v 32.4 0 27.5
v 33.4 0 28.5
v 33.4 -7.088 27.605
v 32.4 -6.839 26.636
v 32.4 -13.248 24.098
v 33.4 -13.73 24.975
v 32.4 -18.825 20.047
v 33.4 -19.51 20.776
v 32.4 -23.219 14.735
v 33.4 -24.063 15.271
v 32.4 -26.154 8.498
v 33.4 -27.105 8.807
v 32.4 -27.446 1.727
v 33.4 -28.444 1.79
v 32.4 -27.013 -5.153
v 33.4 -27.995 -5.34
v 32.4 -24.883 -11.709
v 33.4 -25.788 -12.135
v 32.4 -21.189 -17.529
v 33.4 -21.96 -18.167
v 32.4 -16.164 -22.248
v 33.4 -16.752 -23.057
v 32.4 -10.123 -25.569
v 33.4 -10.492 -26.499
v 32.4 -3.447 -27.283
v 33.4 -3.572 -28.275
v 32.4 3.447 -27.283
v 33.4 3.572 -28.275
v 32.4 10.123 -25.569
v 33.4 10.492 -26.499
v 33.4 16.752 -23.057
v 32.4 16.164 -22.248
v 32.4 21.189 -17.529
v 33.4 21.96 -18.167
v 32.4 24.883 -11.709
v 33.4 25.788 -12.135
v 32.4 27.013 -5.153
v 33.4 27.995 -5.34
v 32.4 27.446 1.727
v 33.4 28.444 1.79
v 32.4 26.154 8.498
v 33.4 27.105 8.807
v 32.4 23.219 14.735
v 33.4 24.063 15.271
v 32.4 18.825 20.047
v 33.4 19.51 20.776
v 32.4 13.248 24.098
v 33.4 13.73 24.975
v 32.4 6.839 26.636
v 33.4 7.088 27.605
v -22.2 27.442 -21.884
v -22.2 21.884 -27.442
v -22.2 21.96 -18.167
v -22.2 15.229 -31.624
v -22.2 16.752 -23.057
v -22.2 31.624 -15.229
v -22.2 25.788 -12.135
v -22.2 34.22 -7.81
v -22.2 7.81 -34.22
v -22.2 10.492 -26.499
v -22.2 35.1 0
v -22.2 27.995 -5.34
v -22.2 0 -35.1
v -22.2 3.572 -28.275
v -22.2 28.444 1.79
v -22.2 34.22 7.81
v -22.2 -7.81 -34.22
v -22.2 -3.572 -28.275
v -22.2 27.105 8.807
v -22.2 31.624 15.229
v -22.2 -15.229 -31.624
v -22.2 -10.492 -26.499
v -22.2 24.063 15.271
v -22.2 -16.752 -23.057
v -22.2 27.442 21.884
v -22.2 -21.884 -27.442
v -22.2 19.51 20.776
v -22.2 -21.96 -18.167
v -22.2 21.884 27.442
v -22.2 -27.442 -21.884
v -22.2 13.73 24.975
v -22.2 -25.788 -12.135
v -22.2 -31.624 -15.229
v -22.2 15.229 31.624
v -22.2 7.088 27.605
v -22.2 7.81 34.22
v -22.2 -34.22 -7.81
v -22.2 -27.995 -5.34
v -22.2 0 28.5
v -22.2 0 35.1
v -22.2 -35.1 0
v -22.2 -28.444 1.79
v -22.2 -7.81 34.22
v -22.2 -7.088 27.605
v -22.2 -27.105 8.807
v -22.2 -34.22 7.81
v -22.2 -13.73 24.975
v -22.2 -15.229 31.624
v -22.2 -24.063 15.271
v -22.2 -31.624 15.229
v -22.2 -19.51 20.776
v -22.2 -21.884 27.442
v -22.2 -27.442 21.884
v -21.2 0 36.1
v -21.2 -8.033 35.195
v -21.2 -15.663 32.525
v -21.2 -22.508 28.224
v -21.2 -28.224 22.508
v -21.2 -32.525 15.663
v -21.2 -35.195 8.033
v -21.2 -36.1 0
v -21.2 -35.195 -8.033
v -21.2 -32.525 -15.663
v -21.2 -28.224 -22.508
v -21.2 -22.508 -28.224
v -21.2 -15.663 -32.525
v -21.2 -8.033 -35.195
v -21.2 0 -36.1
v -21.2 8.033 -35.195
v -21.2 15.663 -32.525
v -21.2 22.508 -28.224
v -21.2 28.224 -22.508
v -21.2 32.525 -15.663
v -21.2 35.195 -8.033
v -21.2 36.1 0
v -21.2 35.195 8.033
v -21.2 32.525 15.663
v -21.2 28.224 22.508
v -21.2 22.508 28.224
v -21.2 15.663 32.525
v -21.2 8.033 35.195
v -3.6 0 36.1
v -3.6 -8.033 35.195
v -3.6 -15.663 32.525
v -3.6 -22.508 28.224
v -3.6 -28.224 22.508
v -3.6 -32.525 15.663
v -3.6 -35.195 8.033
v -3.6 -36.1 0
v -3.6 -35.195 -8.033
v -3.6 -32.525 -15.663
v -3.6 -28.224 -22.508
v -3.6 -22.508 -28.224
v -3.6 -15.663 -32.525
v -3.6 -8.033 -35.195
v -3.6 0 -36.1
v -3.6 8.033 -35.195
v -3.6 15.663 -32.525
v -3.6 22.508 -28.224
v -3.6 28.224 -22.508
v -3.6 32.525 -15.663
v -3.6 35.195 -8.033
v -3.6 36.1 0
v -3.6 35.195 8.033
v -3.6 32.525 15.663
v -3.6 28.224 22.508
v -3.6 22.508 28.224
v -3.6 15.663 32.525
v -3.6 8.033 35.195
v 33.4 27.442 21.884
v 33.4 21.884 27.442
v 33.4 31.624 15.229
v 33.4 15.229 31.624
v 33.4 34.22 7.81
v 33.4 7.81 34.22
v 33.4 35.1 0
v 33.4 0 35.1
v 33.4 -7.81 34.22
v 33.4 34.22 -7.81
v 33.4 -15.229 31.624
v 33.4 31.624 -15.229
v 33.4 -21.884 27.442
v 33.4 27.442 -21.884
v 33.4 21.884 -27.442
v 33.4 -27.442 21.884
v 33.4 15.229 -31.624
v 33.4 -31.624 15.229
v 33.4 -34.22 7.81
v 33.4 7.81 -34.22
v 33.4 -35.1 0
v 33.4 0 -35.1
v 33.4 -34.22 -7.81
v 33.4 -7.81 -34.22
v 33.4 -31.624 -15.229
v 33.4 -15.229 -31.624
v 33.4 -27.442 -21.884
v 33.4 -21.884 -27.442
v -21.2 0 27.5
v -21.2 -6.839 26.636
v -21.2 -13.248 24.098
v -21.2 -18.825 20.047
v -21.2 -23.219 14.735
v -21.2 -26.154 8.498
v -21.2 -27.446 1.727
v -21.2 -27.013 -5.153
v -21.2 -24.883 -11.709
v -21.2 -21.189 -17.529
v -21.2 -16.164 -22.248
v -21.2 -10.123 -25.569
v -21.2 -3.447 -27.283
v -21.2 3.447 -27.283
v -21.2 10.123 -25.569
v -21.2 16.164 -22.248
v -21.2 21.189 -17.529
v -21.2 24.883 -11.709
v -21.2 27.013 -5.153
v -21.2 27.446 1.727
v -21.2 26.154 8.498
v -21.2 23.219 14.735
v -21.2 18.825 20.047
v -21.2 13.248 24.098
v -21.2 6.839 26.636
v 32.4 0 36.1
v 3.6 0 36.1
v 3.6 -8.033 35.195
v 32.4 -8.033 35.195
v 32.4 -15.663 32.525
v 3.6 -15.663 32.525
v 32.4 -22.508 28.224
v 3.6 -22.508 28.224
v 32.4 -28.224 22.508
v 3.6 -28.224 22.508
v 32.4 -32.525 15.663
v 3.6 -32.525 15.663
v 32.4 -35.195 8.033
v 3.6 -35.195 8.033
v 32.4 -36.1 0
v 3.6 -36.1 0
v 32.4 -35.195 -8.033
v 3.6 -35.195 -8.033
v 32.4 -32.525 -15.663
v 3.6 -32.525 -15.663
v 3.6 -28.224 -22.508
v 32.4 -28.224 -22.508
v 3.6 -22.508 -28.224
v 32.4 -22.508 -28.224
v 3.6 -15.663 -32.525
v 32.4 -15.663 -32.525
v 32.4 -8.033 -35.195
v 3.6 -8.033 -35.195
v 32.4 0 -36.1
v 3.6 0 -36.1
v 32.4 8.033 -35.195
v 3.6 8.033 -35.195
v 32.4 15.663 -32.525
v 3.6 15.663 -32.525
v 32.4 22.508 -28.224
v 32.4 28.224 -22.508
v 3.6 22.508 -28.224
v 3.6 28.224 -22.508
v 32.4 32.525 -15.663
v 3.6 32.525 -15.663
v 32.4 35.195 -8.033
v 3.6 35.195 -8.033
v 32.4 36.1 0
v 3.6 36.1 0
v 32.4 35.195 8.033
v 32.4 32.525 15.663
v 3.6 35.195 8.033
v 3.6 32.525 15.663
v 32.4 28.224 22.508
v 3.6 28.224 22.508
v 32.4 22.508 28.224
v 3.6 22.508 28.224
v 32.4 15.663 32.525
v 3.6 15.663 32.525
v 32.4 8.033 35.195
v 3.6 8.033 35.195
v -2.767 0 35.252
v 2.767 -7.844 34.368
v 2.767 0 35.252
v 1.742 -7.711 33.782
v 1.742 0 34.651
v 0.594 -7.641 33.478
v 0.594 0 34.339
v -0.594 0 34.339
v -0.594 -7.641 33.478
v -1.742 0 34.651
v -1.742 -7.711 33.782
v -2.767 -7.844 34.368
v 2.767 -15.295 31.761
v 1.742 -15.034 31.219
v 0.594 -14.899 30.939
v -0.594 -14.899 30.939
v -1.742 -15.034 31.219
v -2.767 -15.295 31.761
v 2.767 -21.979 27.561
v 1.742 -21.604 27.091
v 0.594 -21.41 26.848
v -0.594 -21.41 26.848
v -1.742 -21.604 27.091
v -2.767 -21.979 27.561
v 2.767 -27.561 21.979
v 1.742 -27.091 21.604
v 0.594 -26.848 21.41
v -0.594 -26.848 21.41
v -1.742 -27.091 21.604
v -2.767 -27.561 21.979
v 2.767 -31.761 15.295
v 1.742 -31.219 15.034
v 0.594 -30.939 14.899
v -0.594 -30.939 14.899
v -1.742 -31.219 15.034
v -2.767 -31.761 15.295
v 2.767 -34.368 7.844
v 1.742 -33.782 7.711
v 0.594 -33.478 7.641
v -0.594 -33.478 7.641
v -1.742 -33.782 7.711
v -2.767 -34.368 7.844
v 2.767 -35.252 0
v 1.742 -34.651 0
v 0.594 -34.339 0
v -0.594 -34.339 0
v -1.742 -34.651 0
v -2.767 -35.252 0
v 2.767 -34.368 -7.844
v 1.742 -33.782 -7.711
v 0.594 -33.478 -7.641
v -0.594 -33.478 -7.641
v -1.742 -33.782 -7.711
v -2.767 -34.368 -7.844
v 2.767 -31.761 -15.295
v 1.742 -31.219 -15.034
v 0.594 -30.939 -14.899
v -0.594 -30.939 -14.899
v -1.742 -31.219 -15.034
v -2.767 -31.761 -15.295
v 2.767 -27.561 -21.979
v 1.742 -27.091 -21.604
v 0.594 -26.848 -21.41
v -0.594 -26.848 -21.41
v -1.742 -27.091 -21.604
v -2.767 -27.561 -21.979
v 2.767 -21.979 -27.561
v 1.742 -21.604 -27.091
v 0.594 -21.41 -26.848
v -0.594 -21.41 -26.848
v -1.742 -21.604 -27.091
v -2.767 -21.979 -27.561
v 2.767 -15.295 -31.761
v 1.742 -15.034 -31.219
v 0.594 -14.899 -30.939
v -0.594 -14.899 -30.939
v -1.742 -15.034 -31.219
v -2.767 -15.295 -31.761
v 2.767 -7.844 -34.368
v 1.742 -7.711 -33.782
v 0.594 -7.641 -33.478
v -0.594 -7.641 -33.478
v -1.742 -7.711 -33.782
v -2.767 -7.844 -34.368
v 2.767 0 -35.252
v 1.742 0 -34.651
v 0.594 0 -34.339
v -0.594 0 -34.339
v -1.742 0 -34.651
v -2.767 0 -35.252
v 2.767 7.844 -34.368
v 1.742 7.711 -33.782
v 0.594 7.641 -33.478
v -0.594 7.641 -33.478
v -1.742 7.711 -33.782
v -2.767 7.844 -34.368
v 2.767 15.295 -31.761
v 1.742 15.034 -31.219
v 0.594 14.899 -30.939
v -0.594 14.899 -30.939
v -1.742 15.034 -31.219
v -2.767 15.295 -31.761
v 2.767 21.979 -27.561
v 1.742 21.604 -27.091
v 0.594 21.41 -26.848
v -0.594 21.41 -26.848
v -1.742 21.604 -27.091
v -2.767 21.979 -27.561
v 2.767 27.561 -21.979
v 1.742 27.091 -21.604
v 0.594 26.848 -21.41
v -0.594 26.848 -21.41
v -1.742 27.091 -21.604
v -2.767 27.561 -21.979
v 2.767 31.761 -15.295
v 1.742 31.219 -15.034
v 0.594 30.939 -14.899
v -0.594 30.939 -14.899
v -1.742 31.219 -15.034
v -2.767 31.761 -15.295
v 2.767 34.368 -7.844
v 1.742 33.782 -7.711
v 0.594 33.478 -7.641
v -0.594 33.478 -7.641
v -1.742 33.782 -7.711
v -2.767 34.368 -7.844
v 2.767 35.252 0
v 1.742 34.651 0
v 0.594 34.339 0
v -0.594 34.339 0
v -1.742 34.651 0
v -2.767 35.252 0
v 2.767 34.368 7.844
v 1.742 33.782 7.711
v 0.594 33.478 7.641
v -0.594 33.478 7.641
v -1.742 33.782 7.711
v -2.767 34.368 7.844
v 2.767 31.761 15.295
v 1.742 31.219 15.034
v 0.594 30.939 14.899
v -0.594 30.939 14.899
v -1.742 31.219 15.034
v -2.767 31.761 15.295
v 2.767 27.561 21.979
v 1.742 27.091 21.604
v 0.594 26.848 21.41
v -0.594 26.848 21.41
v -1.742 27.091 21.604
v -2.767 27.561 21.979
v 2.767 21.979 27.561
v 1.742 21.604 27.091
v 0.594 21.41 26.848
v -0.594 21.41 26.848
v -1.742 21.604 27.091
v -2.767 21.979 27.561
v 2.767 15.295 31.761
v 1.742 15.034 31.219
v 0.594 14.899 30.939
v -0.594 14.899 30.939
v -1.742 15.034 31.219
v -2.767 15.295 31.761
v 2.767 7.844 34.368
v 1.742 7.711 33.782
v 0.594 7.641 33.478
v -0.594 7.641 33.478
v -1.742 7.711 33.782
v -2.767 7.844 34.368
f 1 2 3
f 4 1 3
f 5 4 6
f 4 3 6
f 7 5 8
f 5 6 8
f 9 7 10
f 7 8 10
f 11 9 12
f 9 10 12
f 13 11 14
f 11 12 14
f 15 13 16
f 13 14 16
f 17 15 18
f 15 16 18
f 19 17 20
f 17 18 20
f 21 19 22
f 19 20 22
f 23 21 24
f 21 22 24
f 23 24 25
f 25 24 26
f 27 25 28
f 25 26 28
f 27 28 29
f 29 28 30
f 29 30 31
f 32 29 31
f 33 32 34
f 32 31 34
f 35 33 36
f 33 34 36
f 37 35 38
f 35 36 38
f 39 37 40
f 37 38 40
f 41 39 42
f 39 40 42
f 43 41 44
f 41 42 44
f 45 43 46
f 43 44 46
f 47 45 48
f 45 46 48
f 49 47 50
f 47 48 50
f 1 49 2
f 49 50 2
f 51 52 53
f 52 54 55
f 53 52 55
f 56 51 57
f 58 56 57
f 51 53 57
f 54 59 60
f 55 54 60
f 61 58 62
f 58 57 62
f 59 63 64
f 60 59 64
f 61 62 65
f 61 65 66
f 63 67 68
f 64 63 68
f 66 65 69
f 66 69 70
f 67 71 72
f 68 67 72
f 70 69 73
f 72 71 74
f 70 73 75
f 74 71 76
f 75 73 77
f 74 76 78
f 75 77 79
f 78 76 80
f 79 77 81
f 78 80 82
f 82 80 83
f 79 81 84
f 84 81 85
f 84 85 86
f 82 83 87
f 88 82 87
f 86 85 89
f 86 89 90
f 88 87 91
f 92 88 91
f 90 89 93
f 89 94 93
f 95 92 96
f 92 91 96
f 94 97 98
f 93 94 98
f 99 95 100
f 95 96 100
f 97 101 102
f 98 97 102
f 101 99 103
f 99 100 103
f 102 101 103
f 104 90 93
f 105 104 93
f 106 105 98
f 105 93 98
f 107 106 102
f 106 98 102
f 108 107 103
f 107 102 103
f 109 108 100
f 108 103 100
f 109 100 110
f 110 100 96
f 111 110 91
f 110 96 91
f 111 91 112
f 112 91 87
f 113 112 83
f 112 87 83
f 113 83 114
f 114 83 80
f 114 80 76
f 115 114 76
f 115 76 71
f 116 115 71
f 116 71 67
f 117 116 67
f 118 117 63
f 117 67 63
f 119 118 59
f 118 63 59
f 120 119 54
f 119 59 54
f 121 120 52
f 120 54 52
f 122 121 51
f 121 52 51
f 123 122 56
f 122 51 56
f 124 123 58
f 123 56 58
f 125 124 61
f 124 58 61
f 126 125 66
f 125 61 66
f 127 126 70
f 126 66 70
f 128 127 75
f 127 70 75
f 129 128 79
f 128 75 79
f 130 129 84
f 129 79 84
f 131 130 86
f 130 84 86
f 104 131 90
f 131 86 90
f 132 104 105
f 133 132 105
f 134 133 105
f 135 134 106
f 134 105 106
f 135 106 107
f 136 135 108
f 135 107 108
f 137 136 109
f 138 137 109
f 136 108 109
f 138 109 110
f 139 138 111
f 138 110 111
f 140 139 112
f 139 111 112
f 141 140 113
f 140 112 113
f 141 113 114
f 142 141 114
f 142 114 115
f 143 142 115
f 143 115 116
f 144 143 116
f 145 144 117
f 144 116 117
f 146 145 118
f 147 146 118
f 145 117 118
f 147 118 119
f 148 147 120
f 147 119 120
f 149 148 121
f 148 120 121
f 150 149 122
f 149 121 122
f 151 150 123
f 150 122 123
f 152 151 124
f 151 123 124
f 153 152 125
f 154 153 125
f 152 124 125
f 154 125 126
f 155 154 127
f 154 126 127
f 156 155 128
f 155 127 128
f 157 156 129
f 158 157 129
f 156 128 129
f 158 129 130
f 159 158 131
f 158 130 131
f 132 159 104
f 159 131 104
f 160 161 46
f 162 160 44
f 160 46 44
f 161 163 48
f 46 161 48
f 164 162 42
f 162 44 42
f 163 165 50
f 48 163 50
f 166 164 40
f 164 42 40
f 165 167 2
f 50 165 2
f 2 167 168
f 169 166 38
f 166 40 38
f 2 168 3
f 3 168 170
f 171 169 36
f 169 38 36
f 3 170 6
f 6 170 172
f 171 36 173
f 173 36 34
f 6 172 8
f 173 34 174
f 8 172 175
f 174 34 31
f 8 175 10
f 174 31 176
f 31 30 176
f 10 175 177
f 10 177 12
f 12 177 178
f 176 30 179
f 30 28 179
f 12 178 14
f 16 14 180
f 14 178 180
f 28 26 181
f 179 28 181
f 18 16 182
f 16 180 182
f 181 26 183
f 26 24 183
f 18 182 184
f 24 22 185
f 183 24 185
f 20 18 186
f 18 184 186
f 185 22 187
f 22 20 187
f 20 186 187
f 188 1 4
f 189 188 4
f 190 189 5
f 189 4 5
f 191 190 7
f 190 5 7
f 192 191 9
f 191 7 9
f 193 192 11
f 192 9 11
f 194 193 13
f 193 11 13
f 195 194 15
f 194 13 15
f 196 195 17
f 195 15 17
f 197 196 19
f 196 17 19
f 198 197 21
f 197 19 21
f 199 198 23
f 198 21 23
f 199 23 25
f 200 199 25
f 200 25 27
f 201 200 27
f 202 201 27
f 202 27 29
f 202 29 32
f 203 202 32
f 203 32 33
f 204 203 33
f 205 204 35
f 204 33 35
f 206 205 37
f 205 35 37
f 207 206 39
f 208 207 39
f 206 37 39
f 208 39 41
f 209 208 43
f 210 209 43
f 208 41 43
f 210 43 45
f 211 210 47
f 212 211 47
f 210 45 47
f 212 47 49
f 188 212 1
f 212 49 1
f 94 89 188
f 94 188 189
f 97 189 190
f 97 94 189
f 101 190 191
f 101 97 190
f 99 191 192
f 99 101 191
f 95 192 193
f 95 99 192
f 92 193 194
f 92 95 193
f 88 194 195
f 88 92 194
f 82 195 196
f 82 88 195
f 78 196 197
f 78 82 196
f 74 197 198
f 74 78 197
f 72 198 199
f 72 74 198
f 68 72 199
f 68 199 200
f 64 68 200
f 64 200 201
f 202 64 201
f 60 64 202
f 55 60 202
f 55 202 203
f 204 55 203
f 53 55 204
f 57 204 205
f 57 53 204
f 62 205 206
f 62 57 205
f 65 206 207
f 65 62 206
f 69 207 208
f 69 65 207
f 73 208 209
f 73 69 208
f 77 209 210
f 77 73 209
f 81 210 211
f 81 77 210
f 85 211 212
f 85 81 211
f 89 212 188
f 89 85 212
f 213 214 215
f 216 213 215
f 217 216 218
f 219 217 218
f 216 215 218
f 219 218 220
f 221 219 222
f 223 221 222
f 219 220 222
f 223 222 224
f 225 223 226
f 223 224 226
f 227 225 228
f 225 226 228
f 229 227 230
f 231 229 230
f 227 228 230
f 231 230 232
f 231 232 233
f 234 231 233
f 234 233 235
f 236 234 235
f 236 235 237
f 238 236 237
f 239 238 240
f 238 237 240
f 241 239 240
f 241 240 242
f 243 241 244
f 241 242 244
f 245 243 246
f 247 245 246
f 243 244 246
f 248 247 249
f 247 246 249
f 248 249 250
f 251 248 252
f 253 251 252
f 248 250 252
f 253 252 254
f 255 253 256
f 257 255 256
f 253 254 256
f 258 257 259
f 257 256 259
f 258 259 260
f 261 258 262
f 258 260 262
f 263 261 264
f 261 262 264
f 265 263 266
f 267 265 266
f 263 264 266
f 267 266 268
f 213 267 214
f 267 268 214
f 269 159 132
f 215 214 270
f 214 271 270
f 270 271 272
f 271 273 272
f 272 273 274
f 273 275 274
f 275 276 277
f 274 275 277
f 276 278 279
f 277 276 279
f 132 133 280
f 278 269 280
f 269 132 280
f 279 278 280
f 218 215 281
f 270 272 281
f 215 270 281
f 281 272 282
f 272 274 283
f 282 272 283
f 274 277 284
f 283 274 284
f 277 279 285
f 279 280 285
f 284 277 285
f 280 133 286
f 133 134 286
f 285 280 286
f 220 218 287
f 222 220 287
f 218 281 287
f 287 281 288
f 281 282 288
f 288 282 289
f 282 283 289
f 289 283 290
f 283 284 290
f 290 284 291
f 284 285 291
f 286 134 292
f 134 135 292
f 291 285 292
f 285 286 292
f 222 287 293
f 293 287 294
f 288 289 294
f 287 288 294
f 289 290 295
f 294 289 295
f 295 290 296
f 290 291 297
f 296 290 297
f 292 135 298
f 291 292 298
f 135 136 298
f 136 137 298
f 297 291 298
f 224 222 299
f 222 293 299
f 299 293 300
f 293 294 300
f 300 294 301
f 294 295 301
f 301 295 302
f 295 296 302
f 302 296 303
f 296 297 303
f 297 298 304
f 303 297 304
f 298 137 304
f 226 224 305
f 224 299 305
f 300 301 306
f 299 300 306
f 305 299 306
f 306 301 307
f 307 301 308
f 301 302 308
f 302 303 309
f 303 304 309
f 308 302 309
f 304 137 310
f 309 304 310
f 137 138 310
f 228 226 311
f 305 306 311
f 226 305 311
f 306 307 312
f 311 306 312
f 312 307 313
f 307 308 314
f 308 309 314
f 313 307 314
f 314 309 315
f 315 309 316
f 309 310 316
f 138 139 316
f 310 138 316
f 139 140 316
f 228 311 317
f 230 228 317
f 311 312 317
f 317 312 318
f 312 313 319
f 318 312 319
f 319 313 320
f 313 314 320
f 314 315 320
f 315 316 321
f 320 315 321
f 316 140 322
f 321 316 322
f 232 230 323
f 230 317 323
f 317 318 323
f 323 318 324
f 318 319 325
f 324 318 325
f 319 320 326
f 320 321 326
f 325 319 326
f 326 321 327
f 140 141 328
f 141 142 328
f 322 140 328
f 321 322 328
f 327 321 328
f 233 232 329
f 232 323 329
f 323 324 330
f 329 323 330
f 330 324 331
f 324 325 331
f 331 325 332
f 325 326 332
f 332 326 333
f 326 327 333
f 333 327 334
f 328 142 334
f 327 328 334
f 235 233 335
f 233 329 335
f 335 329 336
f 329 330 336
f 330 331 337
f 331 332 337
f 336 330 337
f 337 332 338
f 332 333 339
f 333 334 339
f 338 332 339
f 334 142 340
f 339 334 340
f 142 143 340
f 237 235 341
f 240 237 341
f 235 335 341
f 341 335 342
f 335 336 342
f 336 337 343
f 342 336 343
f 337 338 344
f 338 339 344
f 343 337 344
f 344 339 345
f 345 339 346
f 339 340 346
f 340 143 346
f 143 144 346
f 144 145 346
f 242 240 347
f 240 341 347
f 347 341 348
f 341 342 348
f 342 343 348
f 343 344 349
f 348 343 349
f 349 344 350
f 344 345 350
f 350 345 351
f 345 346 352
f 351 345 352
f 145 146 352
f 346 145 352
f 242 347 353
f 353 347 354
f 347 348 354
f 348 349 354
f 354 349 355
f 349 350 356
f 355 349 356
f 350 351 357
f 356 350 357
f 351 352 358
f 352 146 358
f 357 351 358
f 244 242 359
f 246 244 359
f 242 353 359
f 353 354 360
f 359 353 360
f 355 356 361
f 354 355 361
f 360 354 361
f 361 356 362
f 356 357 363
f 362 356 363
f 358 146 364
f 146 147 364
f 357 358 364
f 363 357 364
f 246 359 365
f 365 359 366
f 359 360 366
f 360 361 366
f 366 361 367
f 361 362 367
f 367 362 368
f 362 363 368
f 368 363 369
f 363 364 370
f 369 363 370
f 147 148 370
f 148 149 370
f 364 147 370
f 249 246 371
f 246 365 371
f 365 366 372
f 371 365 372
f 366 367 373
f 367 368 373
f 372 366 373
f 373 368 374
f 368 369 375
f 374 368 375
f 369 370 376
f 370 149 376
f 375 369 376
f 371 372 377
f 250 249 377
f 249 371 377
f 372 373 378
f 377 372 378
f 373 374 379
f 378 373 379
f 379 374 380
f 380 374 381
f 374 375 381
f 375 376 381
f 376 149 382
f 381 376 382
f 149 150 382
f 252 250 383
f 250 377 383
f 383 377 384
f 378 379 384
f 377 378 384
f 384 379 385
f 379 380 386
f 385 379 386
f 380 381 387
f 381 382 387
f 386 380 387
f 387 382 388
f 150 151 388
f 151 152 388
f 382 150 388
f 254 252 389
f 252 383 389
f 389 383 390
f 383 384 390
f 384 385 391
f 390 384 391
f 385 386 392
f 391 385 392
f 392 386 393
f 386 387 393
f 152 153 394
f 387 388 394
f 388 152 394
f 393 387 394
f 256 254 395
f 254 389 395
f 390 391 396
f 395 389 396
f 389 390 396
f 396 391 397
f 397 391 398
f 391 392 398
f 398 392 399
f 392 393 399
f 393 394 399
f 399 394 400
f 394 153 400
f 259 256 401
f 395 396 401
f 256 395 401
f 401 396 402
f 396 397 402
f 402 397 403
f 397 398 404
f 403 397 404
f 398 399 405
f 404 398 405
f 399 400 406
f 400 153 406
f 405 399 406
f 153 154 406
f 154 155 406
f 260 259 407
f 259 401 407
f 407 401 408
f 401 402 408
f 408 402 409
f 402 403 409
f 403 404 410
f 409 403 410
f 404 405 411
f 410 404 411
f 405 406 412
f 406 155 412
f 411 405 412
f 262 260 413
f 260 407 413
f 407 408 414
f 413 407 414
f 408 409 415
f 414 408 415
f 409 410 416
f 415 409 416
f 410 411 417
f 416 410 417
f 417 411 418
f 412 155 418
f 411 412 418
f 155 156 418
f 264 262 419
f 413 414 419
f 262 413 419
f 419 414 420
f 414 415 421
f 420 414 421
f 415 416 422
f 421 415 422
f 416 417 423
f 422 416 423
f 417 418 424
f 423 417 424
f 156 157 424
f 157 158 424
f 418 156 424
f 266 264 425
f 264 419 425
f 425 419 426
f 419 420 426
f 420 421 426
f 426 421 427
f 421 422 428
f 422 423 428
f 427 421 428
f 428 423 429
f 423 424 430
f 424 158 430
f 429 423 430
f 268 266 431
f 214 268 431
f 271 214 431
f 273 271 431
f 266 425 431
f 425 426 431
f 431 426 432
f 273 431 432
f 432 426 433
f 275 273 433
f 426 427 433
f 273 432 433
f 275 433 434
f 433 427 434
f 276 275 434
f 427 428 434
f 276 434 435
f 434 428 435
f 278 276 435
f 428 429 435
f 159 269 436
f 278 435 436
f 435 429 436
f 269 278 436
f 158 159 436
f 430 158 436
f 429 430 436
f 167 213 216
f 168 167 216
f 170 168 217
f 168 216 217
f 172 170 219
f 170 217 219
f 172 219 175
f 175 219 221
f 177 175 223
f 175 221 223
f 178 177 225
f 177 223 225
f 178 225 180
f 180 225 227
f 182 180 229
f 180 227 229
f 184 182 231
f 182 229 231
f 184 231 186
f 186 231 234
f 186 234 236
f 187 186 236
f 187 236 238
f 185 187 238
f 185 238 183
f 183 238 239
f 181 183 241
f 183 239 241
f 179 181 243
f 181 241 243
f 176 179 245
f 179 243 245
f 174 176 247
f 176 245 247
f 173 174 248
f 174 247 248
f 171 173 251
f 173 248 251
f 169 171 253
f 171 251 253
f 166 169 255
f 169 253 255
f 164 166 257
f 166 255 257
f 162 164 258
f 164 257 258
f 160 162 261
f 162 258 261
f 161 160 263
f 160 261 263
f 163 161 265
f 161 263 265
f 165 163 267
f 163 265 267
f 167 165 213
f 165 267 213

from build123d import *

# Parameters (mm, degrees)
CHAMFER_1_SIZE = 1


with BuildPart() as part:
    # 草图1 → 旋转1 (revolve)
    with BuildSketch(Plane.XY):
        with BuildLine():
            Line((-22.2, 27.5), (33.4, 27.5))
            Line((33.4, 27.5), (33.4, 36.1))
            Line((33.4, 36.1), (3.6, 36.1))
            ThreePointArc((3.6, 36.1), (0, 34.3), (-3.6, 36.1))
            Line((-3.6, 36.1), (-22.2, 36.1))
            Line((-22.2, 36.1), (-22.2, 27.5))
        make_face()
    revolve(axis=Axis((-55.01659168, 0, 0), (1, 0, 0)))

    # 倒角1
    chamfer_1_edges = [part.edges().sort_by_distance(p)[0] for p in [
        (-22.2, -36.1, 0),
        (-22.2, -27.5, 0),
        (33.4, -27.5, 0),
        (33.4, -36.1, 0),
    ]]
    chamfer(chamfer_1_edges, length=CHAMFER_1_SIZE)


solid = part.part
